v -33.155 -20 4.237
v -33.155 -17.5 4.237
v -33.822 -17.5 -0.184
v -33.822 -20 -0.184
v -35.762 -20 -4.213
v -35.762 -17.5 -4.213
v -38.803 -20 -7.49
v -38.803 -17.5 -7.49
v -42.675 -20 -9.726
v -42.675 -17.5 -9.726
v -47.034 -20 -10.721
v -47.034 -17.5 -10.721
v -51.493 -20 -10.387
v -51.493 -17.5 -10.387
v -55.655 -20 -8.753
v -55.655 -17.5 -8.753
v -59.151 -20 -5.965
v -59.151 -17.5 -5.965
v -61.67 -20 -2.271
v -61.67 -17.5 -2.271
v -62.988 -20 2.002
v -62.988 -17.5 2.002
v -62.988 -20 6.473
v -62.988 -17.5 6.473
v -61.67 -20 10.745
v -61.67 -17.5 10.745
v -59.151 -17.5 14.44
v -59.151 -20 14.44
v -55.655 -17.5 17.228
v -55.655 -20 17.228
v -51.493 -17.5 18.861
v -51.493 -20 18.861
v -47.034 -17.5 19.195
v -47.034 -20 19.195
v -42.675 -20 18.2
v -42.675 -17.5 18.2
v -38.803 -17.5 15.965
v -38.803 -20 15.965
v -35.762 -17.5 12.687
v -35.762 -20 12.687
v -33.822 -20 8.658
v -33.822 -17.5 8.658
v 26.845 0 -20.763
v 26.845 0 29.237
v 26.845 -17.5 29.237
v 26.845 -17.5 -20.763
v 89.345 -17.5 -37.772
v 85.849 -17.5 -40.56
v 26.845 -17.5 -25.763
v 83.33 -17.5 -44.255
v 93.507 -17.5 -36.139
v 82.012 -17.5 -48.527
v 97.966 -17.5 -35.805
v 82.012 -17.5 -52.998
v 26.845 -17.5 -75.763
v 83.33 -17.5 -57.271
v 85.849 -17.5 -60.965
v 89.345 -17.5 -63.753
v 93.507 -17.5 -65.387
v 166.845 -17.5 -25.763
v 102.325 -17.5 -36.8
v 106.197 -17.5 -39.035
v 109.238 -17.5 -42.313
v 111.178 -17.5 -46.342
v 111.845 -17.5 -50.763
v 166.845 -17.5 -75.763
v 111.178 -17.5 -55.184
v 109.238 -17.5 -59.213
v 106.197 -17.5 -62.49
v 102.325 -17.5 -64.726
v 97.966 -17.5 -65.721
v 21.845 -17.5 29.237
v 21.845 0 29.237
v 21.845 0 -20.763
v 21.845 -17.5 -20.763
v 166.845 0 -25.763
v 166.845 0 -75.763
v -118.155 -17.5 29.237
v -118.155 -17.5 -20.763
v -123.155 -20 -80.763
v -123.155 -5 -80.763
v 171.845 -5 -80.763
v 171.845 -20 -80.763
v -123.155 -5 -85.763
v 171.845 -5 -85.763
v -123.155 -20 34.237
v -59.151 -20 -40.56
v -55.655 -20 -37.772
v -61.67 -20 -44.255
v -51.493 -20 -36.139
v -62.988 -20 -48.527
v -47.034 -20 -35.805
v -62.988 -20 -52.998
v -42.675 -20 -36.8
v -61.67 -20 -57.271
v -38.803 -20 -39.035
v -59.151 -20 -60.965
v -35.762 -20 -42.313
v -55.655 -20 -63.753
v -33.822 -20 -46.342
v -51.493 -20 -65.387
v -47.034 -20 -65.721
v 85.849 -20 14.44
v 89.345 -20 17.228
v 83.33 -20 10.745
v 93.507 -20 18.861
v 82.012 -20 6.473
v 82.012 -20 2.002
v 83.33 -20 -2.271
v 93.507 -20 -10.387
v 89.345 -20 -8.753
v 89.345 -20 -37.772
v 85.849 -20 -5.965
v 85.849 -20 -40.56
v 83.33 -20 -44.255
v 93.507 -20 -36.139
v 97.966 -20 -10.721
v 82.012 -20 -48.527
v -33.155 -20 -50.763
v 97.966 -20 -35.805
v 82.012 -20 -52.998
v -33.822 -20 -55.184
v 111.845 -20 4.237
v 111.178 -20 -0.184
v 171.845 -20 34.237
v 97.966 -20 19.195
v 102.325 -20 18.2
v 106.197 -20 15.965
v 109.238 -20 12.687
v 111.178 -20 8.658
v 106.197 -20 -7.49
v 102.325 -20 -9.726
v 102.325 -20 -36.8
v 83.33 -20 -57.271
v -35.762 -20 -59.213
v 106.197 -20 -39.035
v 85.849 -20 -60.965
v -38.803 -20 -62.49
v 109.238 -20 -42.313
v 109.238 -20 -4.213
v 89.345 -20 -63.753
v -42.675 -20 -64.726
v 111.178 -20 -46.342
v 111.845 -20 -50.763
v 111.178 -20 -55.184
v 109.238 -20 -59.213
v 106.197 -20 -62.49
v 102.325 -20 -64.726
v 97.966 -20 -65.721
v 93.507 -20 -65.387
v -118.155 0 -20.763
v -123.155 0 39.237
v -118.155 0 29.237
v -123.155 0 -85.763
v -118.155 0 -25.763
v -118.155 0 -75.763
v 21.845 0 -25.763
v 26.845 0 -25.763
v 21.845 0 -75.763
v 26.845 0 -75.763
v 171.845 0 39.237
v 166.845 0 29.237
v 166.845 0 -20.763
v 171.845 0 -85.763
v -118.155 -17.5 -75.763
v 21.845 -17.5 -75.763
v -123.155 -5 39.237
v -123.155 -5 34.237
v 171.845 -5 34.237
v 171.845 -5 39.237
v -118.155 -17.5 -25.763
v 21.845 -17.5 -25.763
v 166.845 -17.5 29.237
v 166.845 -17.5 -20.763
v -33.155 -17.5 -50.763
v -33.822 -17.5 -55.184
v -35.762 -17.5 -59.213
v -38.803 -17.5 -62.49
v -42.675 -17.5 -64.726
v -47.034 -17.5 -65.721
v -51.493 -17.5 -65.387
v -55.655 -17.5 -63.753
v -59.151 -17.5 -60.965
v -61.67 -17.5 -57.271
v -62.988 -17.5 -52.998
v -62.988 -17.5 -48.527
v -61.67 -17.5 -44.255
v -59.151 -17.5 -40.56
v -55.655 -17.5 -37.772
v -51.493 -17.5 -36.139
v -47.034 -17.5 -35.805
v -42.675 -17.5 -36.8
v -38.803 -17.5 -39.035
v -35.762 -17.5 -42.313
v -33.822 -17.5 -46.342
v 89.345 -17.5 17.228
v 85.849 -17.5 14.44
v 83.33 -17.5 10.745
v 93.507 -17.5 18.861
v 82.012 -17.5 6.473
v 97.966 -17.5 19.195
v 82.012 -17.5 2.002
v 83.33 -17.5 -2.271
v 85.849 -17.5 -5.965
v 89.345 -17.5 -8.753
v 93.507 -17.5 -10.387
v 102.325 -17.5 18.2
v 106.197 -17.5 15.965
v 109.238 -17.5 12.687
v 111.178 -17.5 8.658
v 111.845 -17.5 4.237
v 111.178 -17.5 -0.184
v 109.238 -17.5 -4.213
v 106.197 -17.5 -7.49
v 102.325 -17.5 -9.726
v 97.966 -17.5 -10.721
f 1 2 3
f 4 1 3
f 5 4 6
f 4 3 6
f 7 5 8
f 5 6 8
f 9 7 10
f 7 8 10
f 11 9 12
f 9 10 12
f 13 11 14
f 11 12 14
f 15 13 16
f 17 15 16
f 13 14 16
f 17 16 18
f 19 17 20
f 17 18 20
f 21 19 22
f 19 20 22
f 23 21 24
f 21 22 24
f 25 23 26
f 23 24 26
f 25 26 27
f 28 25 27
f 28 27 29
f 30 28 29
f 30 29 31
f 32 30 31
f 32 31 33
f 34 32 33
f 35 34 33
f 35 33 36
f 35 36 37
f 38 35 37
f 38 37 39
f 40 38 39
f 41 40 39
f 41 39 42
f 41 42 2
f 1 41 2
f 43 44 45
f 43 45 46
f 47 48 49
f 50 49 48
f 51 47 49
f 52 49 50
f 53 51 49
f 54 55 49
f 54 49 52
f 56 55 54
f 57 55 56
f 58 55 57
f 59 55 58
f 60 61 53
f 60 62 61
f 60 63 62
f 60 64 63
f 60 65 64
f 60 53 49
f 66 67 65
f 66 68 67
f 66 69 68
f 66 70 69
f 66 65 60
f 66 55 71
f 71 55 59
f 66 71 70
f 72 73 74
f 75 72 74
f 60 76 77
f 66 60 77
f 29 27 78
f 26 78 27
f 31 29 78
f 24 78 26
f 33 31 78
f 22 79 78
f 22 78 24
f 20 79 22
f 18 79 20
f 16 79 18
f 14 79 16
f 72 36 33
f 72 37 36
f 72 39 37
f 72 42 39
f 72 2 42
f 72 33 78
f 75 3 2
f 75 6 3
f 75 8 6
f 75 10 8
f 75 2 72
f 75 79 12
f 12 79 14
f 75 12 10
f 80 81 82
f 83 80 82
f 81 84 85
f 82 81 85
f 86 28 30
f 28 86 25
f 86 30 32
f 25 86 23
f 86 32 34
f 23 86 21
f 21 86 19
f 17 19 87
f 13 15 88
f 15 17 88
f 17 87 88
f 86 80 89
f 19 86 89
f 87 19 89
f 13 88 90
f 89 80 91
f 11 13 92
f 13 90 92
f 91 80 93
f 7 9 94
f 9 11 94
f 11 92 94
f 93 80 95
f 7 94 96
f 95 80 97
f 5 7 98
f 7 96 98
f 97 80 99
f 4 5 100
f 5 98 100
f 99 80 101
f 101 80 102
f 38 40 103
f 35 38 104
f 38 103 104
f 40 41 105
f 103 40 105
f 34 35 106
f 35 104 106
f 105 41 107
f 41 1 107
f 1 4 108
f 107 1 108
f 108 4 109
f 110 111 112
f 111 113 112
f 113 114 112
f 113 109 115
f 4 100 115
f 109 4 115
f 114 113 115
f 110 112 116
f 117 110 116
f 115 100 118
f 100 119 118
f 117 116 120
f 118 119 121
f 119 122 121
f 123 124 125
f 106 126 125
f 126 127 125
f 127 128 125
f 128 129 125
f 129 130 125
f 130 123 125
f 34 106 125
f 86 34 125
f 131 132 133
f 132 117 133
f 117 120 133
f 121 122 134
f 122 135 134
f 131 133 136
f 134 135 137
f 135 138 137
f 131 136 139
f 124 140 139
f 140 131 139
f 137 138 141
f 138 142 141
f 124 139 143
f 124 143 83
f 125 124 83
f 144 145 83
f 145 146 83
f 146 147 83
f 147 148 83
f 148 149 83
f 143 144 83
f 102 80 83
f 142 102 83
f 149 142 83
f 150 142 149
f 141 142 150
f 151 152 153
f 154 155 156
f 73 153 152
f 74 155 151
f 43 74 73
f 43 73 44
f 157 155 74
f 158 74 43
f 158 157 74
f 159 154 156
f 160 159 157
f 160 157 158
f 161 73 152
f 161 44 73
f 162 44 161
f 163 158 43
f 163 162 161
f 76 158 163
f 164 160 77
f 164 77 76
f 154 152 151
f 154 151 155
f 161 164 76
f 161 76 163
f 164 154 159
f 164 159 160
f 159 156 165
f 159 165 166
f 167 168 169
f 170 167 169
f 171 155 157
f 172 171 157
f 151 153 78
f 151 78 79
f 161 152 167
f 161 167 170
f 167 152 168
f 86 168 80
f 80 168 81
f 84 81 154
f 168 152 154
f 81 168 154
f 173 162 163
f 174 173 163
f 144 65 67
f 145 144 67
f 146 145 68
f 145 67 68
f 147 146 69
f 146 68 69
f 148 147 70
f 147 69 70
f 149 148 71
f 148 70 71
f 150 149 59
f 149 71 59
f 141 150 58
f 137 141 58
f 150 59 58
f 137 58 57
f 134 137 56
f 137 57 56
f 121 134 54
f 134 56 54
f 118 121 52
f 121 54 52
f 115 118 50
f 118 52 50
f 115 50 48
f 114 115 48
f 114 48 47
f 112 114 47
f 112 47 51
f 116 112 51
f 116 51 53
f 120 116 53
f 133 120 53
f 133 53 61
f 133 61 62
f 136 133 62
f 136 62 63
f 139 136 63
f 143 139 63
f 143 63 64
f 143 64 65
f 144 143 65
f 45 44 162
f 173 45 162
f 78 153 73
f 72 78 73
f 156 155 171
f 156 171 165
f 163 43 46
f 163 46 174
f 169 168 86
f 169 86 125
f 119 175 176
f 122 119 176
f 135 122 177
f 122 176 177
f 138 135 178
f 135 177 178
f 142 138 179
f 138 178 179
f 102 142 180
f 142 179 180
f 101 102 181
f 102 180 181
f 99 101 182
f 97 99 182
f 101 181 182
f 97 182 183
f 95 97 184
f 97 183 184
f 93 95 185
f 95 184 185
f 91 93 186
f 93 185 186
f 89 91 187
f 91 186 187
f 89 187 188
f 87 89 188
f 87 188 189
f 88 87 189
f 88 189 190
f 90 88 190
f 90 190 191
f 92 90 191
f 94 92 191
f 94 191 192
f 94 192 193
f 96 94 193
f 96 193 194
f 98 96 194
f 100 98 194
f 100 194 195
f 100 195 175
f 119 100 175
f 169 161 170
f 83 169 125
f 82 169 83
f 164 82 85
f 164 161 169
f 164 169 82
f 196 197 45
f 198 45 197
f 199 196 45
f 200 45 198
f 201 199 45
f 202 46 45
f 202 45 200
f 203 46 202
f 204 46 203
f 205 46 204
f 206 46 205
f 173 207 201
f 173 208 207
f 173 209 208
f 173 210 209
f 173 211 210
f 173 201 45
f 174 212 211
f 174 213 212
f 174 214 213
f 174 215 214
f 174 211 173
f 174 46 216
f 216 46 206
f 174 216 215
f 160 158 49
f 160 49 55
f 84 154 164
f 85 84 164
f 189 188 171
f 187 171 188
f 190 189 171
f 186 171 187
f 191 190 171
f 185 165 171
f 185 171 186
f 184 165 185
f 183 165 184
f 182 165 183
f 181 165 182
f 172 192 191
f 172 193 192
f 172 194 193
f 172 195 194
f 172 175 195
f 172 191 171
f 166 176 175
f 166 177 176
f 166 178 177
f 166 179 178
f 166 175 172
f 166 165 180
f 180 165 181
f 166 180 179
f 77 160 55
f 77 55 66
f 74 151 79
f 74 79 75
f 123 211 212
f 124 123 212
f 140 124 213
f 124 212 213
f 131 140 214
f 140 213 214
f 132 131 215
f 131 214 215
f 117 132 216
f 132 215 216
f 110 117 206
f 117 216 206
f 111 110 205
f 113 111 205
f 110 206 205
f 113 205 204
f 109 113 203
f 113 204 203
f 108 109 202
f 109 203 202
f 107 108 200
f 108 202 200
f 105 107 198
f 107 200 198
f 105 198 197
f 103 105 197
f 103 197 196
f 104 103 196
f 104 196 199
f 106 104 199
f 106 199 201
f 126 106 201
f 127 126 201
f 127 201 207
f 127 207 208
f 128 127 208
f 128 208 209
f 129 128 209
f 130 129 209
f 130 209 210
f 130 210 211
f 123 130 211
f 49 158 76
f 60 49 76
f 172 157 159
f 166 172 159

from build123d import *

# Parameters (mm, degrees)
SKETCH1_W           = 295
SKETCH1_H           = 125
BOSS_EXTRUDE3_DEPTH = 5
SKETCH2_W           = 295
SKETCH2_H           = 115
BOSS_EXTRUDE4_DEPTH = 20
SKETCH4_W           = 140
SKETCH4_H           = 50
CUT_EXTRUDE1_DEPTH  = 17.5
SKETCH4_3_W         = 140
SKETCH4_3_H         = 50
CUT_EXTRUDE2_DEPTH  = 17.5
SKETCH7_R           = 15
CUT_EXTRUDE3_DEPTH  = 31.5


with BuildPart() as part:
    # Sketch1 → Boss-Extrude3 (new body)
    with BuildSketch(Plane(origin=(0, 0, 0), x_dir=(1, 0, 0), z_dir=(0, 1, 0))):
        with Locations((24.344660194, 23.262829884)):
            Rectangle(SKETCH1_W, SKETCH1_H)
    extrude(amount=-BOSS_EXTRUDE3_DEPTH)

    # Sketch2 → Boss-Extrude4 (add)
    with BuildSketch(Plane(origin=(0, 0, 0), x_dir=(1, 0, 0), z_dir=(0, 1, 0))):
        with Locations((24.344660194, 23.262829884)):
            Rectangle(SKETCH2_W, SKETCH2_H)
    extrude(amount=-BOSS_EXTRUDE4_DEPTH)

    # Sketch4 → Cut-Extrude1 (cut)
    with BuildSketch(Plane(origin=(0, 0, 0), x_dir=(1, 0, 0), z_dir=(0, 1, 0))):
        with Locations((-48.155339806, 50.762829884)):
            Rectangle(SKETCH4_W, SKETCH4_H)
    extrude(amount=-CUT_EXTRUDE1_DEPTH, mode=Mode.SUBTRACT)

    # Sketch4<3> → Cut-Extrude2 (cut)
    with BuildSketch(Plane(origin=(0, 0, 0), x_dir=(1, 0, 0), z_dir=(0, 1, 0))):
        with Locations((-48.155339806, 50.762829884)):
            Rectangle(SKETCH4_3_W, SKETCH4_3_H)
        with Locations((96.844660194, 50.762829884)):
            Rectangle(SKETCH4_3_W, SKETCH4_3_H)
        with Locations((96.844660194, -4.237170116)):
            Rectangle(SKETCH4_3_W, SKETCH4_3_H)
        with Locations((-48.155339806, -4.237170116)):
            Rectangle(SKETCH4_3_W, SKETCH4_3_H)
    extrude(amount=-CUT_EXTRUDE2_DEPTH, mode=Mode.SUBTRACT)

    # Sketch7 → Cut-Extrude3 (cut)
    with BuildSketch(Plane(origin=(0, -17.5, 0), x_dir=(1, 0, 0), z_dir=(0, 1, 0))):
        with Locations((-48.155339806, -4.237170116)):
            Circle(SKETCH7_R)
        with Locations((96.844660194, -4.237170116)):
            Circle(SKETCH7_R)
        with Locations((96.844660194, 50.762829884)):
            Circle(SKETCH7_R)
        with Locations((-48.155339806, 50.762829884)):
            Circle(SKETCH7_R)
    extrude(amount=-CUT_EXTRUDE3_DEPTH, mode=Mode.SUBTRACT)


solid = part.part
